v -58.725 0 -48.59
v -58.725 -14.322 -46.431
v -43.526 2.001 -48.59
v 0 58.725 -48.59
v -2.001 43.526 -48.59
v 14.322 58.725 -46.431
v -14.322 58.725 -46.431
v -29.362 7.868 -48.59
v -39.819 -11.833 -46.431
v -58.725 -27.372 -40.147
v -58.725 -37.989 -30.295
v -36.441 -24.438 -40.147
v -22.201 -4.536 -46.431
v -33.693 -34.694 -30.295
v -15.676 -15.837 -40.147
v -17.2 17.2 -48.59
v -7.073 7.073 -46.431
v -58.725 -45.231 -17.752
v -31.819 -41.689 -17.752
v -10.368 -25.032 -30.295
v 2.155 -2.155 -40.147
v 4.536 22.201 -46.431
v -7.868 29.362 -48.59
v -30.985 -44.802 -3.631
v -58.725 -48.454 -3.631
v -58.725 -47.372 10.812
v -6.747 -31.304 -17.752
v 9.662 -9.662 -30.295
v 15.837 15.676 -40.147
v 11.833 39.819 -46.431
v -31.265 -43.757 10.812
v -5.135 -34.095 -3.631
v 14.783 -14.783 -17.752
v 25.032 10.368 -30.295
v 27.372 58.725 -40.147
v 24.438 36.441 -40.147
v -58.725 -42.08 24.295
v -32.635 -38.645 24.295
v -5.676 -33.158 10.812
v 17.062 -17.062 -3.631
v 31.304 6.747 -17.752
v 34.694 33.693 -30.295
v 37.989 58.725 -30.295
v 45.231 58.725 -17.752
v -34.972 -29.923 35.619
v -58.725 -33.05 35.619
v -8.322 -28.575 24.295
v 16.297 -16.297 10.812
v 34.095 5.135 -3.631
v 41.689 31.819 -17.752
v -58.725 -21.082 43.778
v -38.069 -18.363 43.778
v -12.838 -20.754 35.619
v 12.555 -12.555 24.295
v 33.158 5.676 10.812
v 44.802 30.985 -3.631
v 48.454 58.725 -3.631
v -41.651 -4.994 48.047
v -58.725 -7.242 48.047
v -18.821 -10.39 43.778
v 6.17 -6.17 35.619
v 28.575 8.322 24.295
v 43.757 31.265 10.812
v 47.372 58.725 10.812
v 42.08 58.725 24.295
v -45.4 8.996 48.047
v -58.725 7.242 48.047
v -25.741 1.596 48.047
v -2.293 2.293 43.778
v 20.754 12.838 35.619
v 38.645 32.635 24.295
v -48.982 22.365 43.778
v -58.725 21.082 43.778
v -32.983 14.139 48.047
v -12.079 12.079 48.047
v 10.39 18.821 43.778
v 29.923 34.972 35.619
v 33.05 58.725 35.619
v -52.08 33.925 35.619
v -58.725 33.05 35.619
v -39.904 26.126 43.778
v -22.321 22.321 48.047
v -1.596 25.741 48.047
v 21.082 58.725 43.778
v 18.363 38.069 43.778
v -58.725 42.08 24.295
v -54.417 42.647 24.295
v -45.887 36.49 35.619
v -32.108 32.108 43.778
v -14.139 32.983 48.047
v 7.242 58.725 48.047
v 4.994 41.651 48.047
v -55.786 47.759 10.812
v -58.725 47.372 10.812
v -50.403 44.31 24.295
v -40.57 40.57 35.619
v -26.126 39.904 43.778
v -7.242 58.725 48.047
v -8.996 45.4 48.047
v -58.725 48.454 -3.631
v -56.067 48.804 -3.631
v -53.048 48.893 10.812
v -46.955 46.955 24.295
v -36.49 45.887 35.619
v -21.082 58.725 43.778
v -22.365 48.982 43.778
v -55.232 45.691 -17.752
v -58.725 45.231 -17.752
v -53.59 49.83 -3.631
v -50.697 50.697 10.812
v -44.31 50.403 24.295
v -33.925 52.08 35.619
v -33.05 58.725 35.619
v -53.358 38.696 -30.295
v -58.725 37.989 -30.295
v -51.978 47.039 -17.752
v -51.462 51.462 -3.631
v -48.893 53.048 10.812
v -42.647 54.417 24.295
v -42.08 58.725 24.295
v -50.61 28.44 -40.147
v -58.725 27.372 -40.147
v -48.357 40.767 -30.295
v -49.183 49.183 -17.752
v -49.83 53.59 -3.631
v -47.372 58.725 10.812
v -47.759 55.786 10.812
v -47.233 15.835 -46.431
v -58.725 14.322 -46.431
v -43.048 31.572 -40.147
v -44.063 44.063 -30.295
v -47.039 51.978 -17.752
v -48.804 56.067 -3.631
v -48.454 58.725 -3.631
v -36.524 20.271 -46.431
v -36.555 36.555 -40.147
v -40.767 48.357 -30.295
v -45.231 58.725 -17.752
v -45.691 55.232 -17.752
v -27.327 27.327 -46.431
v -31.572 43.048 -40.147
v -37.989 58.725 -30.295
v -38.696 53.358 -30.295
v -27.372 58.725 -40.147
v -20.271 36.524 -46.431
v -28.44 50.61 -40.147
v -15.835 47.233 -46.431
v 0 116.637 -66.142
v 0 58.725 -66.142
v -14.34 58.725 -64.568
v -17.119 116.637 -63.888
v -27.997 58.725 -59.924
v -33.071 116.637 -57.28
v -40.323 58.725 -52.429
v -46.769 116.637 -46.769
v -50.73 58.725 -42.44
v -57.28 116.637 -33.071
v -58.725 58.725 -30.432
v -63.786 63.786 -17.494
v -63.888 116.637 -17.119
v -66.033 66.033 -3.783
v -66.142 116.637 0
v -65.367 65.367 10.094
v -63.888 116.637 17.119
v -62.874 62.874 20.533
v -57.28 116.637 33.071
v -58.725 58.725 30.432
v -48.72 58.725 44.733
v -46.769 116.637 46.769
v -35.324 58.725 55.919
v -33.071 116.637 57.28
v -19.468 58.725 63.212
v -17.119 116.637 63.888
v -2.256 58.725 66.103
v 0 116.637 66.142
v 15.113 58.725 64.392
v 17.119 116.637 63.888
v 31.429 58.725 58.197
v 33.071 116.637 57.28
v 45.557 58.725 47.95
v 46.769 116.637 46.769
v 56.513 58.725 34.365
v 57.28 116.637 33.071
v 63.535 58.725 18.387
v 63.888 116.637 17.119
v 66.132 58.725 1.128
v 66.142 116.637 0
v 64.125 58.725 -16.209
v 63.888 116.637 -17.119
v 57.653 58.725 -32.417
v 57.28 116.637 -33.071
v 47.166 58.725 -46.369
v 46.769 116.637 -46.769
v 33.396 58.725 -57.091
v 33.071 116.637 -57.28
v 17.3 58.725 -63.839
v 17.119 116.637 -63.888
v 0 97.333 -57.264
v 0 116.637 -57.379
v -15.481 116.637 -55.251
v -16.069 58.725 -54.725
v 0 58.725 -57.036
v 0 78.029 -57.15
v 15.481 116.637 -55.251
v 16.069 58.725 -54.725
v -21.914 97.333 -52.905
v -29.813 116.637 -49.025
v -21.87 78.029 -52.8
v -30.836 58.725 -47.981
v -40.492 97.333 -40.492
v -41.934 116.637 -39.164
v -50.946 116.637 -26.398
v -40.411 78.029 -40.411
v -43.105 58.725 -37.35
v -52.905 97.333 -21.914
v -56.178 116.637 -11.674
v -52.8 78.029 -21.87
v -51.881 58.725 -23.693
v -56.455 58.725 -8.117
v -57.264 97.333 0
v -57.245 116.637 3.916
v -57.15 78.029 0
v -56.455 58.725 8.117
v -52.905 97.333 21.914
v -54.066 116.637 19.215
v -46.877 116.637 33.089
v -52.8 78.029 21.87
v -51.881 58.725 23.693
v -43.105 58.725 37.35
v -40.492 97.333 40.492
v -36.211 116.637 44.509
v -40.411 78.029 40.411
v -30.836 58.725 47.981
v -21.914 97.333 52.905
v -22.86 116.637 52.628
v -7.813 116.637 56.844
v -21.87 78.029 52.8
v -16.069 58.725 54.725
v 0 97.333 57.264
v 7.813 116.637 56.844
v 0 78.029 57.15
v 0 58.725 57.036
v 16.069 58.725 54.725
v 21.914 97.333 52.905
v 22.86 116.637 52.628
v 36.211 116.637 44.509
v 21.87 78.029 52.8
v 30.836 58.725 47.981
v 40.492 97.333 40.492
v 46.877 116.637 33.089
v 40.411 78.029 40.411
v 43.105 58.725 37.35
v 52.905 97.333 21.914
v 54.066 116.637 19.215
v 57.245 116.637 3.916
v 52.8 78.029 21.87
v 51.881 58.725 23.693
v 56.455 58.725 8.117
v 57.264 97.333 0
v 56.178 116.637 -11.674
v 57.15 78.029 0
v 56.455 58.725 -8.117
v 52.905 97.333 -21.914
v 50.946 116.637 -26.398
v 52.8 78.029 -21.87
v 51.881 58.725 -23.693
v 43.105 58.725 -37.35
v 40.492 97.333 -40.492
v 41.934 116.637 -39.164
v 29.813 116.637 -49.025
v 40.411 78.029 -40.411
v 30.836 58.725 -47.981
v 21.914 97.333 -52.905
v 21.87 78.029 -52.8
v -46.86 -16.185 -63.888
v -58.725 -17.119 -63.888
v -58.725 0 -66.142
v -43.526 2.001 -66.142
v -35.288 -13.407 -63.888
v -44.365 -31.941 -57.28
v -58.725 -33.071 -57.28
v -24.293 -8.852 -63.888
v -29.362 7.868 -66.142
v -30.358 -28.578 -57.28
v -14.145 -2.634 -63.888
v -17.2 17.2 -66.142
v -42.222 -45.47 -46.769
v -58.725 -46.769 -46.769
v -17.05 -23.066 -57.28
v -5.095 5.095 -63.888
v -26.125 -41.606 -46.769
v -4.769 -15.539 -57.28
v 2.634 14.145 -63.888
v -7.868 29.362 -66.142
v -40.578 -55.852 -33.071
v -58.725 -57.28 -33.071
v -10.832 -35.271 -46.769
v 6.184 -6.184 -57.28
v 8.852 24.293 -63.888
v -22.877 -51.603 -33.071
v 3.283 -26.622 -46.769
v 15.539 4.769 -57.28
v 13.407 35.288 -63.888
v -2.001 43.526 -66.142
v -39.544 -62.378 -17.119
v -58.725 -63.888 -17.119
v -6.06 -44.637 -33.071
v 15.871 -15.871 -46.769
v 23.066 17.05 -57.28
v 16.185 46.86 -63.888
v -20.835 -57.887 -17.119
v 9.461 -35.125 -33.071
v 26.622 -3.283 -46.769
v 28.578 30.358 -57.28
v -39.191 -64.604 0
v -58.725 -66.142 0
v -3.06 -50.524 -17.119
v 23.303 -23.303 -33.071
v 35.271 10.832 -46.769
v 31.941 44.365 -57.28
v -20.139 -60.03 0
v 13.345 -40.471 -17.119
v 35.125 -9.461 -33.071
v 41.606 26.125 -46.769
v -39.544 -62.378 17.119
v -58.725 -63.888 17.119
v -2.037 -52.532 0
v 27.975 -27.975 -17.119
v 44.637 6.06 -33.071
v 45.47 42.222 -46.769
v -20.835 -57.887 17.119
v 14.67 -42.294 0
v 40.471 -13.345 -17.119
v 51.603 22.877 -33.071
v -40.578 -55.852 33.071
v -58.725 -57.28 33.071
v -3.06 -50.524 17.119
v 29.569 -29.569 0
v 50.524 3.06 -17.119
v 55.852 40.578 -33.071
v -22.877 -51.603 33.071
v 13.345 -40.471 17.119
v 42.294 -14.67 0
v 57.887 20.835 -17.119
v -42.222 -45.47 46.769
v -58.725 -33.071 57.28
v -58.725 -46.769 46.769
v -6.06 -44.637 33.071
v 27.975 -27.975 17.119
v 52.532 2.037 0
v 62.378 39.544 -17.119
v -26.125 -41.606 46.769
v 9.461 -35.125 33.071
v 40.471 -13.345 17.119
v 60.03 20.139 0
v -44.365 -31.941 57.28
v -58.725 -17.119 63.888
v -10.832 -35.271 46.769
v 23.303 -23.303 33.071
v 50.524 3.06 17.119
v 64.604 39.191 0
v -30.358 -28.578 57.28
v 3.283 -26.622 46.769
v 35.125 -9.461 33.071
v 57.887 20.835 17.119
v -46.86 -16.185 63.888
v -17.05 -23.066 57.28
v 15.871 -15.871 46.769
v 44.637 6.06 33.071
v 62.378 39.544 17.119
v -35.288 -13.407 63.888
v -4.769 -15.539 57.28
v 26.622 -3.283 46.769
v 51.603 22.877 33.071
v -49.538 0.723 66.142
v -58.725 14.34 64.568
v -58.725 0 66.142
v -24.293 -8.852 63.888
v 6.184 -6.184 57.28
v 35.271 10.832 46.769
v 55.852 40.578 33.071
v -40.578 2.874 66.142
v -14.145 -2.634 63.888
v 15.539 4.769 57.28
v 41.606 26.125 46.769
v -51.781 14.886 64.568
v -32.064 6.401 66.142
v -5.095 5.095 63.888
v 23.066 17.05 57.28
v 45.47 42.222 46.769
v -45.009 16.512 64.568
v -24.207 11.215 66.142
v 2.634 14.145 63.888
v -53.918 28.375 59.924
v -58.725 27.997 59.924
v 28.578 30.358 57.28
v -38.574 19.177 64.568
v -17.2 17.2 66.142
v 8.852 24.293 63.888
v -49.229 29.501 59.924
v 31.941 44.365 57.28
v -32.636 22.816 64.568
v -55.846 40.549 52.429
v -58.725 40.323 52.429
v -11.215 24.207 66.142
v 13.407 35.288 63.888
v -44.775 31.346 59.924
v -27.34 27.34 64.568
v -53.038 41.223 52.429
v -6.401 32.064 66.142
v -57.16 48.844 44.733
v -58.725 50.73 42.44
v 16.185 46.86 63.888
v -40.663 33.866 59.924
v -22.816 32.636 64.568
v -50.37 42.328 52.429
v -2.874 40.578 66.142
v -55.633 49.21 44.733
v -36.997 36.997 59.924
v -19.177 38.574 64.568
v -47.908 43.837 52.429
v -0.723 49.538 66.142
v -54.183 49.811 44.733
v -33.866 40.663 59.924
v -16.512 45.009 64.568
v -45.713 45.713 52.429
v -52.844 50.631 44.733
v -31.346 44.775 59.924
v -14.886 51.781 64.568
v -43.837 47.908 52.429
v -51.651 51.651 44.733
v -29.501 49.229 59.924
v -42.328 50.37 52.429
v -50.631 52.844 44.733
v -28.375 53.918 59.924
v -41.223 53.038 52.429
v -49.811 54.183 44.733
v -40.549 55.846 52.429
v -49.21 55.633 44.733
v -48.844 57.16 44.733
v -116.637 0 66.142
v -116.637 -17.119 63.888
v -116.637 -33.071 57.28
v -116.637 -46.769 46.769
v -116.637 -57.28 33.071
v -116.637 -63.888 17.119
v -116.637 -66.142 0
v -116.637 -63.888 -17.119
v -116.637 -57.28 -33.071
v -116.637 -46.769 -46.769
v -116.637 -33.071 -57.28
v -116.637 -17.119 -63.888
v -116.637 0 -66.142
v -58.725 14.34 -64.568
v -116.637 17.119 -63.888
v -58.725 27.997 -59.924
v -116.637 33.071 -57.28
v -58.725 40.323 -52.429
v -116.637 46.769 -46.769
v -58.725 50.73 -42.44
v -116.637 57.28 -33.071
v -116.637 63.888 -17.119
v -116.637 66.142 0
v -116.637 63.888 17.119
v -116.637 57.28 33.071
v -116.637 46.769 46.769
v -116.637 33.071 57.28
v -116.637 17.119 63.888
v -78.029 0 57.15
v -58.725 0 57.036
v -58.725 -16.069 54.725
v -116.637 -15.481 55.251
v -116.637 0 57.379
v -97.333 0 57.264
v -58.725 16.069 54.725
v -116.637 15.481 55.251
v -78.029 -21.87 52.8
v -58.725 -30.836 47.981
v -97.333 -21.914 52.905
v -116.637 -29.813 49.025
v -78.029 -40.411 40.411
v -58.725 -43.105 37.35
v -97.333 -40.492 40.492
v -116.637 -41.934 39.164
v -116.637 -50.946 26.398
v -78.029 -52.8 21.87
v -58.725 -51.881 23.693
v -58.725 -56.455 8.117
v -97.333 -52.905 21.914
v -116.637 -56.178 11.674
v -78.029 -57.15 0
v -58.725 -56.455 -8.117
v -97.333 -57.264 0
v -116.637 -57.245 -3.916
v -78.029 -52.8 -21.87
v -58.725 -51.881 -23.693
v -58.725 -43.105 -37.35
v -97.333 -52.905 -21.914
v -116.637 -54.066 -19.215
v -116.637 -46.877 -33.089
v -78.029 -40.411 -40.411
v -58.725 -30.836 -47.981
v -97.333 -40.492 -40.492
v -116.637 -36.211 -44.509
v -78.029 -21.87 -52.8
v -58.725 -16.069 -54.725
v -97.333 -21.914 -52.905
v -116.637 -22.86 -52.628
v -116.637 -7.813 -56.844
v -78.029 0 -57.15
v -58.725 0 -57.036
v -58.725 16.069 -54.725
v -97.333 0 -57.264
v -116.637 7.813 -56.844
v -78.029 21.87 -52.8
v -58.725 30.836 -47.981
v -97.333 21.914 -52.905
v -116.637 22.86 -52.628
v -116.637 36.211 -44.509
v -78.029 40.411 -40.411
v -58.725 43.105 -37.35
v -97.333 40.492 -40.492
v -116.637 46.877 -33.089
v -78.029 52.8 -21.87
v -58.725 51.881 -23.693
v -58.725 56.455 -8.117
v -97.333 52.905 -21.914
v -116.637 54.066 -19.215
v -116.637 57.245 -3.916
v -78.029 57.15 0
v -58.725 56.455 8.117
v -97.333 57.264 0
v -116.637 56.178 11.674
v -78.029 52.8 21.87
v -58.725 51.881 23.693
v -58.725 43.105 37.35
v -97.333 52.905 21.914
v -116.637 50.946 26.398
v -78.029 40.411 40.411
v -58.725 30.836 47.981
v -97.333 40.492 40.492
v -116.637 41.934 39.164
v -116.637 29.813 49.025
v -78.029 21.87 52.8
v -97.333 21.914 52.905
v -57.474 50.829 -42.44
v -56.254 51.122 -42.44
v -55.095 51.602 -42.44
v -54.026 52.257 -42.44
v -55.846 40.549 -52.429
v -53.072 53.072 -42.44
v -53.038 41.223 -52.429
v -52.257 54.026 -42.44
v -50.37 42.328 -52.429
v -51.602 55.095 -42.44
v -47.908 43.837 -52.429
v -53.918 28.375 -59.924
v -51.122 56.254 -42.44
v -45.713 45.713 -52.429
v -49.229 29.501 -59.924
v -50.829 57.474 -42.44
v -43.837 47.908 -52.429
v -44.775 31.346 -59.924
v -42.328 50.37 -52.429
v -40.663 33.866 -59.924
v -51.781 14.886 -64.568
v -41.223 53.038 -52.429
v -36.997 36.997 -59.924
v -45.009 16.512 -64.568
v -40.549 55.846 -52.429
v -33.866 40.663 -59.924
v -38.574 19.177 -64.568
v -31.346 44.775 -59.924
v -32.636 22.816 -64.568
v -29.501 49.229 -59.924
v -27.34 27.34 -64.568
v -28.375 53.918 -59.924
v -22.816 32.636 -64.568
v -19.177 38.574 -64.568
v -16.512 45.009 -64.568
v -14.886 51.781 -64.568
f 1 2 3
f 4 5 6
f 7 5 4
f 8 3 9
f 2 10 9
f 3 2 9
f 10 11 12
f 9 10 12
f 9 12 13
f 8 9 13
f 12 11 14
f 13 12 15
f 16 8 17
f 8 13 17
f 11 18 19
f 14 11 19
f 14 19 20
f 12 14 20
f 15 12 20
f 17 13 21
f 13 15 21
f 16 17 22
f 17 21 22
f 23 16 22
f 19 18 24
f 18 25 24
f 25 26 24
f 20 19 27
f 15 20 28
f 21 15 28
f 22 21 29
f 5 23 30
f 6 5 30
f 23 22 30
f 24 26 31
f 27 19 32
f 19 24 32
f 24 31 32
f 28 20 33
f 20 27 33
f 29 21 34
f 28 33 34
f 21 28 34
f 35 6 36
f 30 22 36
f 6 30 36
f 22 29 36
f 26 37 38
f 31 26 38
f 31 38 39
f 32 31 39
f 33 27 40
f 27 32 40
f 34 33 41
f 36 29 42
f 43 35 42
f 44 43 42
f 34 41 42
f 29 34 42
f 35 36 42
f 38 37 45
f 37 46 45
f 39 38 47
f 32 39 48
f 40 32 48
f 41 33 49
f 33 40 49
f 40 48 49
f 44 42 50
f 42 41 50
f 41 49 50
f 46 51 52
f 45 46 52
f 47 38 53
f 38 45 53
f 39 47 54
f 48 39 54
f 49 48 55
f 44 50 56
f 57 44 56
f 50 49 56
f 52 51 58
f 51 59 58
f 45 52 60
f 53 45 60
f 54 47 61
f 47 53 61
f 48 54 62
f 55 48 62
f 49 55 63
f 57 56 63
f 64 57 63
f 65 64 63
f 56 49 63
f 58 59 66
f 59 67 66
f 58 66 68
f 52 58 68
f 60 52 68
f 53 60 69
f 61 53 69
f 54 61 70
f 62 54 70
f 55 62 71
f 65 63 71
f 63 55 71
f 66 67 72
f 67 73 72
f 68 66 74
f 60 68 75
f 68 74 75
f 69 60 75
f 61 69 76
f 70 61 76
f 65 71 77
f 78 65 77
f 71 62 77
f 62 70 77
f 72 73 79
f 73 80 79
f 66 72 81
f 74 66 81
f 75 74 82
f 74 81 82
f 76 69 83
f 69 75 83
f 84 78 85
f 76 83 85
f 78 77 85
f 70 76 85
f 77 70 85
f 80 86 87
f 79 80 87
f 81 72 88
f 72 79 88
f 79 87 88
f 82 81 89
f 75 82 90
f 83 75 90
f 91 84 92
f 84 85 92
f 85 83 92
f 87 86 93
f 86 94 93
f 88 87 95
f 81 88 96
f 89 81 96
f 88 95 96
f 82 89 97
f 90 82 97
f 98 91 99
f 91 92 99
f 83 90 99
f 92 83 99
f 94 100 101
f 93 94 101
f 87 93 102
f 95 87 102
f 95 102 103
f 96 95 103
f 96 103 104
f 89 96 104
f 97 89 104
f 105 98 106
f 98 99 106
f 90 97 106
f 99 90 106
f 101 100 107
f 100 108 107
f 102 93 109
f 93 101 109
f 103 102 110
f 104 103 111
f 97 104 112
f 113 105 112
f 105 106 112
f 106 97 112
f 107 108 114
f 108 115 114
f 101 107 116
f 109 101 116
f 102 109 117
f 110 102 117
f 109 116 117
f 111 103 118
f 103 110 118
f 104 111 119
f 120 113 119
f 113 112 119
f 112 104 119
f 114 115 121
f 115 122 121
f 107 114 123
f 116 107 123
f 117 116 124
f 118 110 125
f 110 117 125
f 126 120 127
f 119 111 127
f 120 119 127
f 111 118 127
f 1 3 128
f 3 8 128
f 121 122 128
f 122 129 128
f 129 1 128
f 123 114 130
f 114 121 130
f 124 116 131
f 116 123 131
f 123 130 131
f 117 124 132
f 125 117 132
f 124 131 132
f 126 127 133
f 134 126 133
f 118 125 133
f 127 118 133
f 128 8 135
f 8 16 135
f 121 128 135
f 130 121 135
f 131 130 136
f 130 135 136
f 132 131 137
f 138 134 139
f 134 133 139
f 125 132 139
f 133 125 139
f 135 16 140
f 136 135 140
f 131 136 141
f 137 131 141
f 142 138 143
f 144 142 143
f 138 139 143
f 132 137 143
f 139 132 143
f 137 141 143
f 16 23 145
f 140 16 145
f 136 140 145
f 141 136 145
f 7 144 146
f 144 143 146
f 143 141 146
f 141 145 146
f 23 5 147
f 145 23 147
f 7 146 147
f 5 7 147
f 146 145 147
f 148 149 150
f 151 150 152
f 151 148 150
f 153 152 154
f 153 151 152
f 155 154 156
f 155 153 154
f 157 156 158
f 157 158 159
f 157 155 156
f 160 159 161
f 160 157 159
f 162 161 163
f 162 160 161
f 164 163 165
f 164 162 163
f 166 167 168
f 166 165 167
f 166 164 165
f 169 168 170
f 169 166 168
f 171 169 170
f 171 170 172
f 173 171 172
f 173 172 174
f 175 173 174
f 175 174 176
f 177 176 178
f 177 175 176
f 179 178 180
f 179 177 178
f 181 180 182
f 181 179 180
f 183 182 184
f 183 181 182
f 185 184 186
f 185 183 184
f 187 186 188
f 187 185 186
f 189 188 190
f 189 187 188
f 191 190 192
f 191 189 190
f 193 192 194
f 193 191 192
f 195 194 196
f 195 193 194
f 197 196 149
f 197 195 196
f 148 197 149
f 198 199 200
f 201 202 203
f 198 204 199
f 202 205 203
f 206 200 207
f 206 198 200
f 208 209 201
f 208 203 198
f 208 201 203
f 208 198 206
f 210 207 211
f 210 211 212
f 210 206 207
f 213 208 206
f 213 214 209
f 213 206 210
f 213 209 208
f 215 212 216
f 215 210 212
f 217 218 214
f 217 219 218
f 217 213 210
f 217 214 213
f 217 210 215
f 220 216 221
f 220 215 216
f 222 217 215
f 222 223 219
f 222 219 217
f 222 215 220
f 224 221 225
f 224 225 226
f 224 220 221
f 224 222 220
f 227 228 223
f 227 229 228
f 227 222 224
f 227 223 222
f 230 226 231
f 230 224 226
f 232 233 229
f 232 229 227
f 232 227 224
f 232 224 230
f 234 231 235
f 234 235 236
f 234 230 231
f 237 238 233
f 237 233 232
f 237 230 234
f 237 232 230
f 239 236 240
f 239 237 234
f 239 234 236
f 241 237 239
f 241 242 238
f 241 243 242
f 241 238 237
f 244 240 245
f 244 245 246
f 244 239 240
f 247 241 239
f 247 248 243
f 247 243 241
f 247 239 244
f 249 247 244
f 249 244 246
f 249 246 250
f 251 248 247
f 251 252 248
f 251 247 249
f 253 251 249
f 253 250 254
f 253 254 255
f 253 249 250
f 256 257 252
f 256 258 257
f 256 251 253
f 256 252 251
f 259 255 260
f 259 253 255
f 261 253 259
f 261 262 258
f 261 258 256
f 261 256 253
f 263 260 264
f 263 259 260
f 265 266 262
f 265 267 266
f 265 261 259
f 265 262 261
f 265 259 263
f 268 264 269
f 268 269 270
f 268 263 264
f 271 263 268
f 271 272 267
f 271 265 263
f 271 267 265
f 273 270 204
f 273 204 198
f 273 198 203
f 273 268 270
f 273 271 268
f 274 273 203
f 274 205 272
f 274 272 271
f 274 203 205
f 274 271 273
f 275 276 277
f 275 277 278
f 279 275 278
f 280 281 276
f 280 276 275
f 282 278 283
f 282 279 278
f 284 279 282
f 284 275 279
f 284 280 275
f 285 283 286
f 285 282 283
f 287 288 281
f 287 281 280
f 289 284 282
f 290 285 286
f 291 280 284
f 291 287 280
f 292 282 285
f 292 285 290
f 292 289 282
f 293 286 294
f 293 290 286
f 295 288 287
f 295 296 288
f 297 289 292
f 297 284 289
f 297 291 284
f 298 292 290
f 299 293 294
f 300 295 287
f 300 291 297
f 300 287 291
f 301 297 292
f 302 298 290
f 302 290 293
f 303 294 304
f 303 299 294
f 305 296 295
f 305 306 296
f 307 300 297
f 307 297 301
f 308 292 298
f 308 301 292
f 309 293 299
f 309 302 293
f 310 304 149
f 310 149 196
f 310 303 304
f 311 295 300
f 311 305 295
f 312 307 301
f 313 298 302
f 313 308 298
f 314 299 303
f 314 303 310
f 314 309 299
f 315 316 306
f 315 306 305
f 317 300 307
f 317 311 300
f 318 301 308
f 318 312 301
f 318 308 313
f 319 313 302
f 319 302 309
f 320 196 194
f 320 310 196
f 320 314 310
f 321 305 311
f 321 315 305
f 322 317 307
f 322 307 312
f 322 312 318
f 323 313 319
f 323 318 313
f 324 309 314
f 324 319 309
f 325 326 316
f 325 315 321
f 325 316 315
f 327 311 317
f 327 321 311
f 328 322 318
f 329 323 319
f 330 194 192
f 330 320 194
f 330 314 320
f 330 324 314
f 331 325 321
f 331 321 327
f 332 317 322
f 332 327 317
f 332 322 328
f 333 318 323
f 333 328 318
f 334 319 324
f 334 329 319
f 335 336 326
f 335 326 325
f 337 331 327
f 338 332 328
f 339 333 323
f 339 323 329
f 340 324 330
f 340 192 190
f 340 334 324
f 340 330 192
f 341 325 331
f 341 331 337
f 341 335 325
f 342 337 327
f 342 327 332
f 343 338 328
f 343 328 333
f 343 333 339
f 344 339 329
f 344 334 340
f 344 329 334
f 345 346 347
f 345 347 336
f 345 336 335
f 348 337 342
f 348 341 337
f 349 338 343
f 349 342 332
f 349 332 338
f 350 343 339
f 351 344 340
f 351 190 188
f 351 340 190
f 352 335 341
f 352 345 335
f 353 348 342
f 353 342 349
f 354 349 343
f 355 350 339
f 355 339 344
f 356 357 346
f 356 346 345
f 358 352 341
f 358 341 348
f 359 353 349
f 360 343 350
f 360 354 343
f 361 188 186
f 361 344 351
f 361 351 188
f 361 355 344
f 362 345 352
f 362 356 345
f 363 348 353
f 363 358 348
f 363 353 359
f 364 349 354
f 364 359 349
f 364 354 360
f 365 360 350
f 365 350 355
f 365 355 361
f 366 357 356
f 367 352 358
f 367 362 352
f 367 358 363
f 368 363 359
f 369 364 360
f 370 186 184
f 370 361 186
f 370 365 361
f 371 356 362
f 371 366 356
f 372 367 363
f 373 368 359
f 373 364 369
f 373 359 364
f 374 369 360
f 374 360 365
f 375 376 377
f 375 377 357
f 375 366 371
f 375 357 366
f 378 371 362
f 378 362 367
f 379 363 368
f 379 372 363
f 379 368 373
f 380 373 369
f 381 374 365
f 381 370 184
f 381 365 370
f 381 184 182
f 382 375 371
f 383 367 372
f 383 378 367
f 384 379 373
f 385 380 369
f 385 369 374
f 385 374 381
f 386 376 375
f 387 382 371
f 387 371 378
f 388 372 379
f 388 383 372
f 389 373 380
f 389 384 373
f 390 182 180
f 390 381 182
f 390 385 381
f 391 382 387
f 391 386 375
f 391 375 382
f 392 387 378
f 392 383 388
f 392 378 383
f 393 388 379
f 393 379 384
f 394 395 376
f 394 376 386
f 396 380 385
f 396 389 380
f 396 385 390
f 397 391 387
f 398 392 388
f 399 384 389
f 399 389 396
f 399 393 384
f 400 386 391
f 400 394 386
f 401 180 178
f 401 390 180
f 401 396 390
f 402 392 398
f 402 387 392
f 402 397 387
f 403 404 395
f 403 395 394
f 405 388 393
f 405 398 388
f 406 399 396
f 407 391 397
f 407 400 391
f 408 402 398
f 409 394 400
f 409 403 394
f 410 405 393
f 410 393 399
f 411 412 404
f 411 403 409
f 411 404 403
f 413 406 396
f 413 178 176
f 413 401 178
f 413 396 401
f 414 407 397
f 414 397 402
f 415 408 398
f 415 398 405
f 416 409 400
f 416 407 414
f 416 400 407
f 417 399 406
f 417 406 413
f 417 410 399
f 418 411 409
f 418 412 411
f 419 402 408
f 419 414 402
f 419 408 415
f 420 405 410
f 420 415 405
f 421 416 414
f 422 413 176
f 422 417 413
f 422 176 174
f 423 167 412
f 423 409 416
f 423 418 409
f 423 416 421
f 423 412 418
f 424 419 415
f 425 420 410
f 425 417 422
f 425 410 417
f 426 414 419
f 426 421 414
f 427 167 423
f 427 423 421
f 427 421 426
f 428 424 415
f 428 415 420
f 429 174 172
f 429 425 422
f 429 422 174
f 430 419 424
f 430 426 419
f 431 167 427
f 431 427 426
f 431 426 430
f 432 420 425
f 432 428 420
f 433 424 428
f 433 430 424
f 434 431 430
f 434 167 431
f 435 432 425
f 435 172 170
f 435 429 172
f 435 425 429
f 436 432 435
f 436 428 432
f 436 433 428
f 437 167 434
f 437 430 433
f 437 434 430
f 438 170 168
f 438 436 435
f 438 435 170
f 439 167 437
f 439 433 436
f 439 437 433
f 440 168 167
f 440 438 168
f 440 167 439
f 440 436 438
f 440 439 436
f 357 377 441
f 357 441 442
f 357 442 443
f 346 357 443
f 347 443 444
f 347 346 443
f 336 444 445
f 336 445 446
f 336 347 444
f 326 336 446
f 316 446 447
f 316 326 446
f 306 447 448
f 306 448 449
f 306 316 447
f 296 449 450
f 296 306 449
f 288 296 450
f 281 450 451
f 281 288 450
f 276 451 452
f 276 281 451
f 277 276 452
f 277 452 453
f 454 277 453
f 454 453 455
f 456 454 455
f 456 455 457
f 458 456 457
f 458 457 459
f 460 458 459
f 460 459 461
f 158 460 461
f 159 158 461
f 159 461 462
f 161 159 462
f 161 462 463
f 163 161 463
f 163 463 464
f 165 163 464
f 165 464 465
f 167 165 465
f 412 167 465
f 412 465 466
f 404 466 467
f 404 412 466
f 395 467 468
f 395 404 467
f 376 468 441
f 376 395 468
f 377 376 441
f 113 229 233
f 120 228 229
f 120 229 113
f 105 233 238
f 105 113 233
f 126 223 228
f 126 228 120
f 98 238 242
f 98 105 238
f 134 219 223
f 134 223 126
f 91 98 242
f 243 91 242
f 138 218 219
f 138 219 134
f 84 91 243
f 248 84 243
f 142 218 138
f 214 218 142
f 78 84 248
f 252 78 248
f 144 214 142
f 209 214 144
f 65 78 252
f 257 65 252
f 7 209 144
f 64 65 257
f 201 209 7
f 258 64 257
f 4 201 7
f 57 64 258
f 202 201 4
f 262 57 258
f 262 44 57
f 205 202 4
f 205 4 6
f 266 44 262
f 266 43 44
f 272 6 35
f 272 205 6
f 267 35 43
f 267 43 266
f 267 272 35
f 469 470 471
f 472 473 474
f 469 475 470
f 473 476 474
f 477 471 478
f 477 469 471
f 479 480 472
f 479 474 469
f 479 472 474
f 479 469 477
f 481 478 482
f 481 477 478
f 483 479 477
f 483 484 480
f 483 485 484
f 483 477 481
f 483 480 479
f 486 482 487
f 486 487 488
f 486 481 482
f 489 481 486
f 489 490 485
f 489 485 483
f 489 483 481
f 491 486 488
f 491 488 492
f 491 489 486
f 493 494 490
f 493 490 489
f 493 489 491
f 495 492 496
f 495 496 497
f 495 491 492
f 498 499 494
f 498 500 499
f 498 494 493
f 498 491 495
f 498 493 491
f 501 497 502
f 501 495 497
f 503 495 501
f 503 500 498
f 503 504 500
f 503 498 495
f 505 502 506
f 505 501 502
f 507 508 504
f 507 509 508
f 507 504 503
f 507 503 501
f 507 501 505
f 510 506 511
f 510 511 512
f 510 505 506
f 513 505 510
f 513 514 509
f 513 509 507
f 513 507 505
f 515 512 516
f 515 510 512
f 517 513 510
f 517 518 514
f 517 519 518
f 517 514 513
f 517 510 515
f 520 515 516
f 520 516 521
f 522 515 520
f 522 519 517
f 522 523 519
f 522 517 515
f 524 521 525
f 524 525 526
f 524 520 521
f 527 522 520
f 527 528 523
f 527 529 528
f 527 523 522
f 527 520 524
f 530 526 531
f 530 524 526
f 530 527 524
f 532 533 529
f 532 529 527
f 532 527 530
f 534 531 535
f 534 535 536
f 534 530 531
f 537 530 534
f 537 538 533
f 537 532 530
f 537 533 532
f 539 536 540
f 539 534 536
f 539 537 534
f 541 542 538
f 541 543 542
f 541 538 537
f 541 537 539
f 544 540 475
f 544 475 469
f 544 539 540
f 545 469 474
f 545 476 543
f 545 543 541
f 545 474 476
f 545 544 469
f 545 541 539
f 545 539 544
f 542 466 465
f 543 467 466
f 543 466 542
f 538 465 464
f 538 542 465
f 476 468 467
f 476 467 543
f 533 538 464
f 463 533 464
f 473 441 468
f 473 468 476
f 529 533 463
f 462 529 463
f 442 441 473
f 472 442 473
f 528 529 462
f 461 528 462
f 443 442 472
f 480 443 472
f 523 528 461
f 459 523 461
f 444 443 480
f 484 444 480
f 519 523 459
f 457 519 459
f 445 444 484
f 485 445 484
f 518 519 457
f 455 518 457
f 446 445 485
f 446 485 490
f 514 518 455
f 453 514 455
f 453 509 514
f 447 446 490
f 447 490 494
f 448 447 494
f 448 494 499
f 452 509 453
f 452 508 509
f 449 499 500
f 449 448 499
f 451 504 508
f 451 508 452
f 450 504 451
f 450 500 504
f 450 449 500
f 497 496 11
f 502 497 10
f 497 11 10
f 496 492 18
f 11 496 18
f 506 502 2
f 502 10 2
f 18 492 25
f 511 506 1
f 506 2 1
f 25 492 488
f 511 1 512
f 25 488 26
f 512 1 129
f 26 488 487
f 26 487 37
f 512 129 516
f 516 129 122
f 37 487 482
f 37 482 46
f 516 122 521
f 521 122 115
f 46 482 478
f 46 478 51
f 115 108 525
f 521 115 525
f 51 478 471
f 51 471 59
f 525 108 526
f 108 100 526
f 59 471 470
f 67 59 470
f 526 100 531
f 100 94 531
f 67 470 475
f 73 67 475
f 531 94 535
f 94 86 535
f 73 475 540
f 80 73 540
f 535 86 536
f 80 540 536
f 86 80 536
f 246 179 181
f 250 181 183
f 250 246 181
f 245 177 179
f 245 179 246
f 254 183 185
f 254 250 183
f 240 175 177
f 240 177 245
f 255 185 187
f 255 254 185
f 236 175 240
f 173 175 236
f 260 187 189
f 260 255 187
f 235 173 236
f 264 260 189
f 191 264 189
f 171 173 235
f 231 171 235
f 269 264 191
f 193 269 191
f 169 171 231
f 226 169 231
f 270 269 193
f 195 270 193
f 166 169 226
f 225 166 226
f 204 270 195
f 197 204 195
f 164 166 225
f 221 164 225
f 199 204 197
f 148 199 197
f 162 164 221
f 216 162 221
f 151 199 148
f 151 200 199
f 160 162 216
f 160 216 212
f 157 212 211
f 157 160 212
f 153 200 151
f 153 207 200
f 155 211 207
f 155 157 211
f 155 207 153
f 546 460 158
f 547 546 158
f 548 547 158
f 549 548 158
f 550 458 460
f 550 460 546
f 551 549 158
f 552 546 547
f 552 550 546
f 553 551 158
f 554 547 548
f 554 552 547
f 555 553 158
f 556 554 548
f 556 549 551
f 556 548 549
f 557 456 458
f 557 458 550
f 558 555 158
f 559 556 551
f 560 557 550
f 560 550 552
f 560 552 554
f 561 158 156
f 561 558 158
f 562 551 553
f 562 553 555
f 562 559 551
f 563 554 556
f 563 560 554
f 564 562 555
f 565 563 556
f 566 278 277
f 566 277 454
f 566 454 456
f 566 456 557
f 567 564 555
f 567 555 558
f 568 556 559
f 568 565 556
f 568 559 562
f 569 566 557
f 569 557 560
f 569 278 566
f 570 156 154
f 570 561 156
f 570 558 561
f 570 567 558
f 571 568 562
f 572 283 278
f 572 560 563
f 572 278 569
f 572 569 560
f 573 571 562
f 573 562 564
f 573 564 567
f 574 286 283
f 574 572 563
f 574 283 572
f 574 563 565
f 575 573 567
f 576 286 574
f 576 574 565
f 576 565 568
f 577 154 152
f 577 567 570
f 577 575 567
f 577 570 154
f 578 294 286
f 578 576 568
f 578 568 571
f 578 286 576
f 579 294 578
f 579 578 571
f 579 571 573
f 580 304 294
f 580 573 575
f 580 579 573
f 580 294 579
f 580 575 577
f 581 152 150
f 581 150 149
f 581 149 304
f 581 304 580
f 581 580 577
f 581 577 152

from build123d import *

# Parameters (mm, degrees)
SKETCH3_R   = 66.1416
SKETCH3_R_2 = 48.5902


with BuildPart() as part:
    # Sketch1 → Revolve1 (revolve)
    with BuildSketch(Plane.XY):
        Polygon((-116.6368, -66.1416), (-58.7248, -66.1416), (-58.7248, -57.0357), (-116.6368, -57.3786), align=None)
    revolve(axis=Axis((-116.6368, 0, 0), (1, 0, 0)))


with BuildPart() as body_2:
    # Sketch2 → Revolve2 (revolve)
    with BuildSketch(Plane.XY):
        Polygon((57.3786, 116.6368), (57.0357, 58.7248), (66.1416, 58.7248), (66.1416, 116.6368), align=None)
    revolve(axis=Axis((0, 0, 0), (0, 1, 0)))


with BuildPart() as sweep1_tool:
    # Sweep1: sweep along a path in Sketch4
    with BuildLine(Plane.XY) as sweep1_path:
        ThreePointArc((-58.7248, 0), (-17.200096, 17.200096), (0, 58.7248))
    # Sketch3 → Sweep1 (sweep)
    with BuildSketch(Plane(origin=(-58.7248, 0, 0), x_dir=(0, 0, -1), z_dir=(1, 0, 0))):
        Circle(SKETCH3_R)
        Circle(SKETCH3_R_2, mode=Mode.SUBTRACT)
    sweep(path=sweep1_path.line)


with BuildPart() as part_1:
    add(part.part)


with BuildPart() as part_2:
    # Sweep1: joined with sweep1_tool
    add(part_1.part.fuse(sweep1_tool.part, body_2.part, tol=0.00001))


solid = part_2.part
